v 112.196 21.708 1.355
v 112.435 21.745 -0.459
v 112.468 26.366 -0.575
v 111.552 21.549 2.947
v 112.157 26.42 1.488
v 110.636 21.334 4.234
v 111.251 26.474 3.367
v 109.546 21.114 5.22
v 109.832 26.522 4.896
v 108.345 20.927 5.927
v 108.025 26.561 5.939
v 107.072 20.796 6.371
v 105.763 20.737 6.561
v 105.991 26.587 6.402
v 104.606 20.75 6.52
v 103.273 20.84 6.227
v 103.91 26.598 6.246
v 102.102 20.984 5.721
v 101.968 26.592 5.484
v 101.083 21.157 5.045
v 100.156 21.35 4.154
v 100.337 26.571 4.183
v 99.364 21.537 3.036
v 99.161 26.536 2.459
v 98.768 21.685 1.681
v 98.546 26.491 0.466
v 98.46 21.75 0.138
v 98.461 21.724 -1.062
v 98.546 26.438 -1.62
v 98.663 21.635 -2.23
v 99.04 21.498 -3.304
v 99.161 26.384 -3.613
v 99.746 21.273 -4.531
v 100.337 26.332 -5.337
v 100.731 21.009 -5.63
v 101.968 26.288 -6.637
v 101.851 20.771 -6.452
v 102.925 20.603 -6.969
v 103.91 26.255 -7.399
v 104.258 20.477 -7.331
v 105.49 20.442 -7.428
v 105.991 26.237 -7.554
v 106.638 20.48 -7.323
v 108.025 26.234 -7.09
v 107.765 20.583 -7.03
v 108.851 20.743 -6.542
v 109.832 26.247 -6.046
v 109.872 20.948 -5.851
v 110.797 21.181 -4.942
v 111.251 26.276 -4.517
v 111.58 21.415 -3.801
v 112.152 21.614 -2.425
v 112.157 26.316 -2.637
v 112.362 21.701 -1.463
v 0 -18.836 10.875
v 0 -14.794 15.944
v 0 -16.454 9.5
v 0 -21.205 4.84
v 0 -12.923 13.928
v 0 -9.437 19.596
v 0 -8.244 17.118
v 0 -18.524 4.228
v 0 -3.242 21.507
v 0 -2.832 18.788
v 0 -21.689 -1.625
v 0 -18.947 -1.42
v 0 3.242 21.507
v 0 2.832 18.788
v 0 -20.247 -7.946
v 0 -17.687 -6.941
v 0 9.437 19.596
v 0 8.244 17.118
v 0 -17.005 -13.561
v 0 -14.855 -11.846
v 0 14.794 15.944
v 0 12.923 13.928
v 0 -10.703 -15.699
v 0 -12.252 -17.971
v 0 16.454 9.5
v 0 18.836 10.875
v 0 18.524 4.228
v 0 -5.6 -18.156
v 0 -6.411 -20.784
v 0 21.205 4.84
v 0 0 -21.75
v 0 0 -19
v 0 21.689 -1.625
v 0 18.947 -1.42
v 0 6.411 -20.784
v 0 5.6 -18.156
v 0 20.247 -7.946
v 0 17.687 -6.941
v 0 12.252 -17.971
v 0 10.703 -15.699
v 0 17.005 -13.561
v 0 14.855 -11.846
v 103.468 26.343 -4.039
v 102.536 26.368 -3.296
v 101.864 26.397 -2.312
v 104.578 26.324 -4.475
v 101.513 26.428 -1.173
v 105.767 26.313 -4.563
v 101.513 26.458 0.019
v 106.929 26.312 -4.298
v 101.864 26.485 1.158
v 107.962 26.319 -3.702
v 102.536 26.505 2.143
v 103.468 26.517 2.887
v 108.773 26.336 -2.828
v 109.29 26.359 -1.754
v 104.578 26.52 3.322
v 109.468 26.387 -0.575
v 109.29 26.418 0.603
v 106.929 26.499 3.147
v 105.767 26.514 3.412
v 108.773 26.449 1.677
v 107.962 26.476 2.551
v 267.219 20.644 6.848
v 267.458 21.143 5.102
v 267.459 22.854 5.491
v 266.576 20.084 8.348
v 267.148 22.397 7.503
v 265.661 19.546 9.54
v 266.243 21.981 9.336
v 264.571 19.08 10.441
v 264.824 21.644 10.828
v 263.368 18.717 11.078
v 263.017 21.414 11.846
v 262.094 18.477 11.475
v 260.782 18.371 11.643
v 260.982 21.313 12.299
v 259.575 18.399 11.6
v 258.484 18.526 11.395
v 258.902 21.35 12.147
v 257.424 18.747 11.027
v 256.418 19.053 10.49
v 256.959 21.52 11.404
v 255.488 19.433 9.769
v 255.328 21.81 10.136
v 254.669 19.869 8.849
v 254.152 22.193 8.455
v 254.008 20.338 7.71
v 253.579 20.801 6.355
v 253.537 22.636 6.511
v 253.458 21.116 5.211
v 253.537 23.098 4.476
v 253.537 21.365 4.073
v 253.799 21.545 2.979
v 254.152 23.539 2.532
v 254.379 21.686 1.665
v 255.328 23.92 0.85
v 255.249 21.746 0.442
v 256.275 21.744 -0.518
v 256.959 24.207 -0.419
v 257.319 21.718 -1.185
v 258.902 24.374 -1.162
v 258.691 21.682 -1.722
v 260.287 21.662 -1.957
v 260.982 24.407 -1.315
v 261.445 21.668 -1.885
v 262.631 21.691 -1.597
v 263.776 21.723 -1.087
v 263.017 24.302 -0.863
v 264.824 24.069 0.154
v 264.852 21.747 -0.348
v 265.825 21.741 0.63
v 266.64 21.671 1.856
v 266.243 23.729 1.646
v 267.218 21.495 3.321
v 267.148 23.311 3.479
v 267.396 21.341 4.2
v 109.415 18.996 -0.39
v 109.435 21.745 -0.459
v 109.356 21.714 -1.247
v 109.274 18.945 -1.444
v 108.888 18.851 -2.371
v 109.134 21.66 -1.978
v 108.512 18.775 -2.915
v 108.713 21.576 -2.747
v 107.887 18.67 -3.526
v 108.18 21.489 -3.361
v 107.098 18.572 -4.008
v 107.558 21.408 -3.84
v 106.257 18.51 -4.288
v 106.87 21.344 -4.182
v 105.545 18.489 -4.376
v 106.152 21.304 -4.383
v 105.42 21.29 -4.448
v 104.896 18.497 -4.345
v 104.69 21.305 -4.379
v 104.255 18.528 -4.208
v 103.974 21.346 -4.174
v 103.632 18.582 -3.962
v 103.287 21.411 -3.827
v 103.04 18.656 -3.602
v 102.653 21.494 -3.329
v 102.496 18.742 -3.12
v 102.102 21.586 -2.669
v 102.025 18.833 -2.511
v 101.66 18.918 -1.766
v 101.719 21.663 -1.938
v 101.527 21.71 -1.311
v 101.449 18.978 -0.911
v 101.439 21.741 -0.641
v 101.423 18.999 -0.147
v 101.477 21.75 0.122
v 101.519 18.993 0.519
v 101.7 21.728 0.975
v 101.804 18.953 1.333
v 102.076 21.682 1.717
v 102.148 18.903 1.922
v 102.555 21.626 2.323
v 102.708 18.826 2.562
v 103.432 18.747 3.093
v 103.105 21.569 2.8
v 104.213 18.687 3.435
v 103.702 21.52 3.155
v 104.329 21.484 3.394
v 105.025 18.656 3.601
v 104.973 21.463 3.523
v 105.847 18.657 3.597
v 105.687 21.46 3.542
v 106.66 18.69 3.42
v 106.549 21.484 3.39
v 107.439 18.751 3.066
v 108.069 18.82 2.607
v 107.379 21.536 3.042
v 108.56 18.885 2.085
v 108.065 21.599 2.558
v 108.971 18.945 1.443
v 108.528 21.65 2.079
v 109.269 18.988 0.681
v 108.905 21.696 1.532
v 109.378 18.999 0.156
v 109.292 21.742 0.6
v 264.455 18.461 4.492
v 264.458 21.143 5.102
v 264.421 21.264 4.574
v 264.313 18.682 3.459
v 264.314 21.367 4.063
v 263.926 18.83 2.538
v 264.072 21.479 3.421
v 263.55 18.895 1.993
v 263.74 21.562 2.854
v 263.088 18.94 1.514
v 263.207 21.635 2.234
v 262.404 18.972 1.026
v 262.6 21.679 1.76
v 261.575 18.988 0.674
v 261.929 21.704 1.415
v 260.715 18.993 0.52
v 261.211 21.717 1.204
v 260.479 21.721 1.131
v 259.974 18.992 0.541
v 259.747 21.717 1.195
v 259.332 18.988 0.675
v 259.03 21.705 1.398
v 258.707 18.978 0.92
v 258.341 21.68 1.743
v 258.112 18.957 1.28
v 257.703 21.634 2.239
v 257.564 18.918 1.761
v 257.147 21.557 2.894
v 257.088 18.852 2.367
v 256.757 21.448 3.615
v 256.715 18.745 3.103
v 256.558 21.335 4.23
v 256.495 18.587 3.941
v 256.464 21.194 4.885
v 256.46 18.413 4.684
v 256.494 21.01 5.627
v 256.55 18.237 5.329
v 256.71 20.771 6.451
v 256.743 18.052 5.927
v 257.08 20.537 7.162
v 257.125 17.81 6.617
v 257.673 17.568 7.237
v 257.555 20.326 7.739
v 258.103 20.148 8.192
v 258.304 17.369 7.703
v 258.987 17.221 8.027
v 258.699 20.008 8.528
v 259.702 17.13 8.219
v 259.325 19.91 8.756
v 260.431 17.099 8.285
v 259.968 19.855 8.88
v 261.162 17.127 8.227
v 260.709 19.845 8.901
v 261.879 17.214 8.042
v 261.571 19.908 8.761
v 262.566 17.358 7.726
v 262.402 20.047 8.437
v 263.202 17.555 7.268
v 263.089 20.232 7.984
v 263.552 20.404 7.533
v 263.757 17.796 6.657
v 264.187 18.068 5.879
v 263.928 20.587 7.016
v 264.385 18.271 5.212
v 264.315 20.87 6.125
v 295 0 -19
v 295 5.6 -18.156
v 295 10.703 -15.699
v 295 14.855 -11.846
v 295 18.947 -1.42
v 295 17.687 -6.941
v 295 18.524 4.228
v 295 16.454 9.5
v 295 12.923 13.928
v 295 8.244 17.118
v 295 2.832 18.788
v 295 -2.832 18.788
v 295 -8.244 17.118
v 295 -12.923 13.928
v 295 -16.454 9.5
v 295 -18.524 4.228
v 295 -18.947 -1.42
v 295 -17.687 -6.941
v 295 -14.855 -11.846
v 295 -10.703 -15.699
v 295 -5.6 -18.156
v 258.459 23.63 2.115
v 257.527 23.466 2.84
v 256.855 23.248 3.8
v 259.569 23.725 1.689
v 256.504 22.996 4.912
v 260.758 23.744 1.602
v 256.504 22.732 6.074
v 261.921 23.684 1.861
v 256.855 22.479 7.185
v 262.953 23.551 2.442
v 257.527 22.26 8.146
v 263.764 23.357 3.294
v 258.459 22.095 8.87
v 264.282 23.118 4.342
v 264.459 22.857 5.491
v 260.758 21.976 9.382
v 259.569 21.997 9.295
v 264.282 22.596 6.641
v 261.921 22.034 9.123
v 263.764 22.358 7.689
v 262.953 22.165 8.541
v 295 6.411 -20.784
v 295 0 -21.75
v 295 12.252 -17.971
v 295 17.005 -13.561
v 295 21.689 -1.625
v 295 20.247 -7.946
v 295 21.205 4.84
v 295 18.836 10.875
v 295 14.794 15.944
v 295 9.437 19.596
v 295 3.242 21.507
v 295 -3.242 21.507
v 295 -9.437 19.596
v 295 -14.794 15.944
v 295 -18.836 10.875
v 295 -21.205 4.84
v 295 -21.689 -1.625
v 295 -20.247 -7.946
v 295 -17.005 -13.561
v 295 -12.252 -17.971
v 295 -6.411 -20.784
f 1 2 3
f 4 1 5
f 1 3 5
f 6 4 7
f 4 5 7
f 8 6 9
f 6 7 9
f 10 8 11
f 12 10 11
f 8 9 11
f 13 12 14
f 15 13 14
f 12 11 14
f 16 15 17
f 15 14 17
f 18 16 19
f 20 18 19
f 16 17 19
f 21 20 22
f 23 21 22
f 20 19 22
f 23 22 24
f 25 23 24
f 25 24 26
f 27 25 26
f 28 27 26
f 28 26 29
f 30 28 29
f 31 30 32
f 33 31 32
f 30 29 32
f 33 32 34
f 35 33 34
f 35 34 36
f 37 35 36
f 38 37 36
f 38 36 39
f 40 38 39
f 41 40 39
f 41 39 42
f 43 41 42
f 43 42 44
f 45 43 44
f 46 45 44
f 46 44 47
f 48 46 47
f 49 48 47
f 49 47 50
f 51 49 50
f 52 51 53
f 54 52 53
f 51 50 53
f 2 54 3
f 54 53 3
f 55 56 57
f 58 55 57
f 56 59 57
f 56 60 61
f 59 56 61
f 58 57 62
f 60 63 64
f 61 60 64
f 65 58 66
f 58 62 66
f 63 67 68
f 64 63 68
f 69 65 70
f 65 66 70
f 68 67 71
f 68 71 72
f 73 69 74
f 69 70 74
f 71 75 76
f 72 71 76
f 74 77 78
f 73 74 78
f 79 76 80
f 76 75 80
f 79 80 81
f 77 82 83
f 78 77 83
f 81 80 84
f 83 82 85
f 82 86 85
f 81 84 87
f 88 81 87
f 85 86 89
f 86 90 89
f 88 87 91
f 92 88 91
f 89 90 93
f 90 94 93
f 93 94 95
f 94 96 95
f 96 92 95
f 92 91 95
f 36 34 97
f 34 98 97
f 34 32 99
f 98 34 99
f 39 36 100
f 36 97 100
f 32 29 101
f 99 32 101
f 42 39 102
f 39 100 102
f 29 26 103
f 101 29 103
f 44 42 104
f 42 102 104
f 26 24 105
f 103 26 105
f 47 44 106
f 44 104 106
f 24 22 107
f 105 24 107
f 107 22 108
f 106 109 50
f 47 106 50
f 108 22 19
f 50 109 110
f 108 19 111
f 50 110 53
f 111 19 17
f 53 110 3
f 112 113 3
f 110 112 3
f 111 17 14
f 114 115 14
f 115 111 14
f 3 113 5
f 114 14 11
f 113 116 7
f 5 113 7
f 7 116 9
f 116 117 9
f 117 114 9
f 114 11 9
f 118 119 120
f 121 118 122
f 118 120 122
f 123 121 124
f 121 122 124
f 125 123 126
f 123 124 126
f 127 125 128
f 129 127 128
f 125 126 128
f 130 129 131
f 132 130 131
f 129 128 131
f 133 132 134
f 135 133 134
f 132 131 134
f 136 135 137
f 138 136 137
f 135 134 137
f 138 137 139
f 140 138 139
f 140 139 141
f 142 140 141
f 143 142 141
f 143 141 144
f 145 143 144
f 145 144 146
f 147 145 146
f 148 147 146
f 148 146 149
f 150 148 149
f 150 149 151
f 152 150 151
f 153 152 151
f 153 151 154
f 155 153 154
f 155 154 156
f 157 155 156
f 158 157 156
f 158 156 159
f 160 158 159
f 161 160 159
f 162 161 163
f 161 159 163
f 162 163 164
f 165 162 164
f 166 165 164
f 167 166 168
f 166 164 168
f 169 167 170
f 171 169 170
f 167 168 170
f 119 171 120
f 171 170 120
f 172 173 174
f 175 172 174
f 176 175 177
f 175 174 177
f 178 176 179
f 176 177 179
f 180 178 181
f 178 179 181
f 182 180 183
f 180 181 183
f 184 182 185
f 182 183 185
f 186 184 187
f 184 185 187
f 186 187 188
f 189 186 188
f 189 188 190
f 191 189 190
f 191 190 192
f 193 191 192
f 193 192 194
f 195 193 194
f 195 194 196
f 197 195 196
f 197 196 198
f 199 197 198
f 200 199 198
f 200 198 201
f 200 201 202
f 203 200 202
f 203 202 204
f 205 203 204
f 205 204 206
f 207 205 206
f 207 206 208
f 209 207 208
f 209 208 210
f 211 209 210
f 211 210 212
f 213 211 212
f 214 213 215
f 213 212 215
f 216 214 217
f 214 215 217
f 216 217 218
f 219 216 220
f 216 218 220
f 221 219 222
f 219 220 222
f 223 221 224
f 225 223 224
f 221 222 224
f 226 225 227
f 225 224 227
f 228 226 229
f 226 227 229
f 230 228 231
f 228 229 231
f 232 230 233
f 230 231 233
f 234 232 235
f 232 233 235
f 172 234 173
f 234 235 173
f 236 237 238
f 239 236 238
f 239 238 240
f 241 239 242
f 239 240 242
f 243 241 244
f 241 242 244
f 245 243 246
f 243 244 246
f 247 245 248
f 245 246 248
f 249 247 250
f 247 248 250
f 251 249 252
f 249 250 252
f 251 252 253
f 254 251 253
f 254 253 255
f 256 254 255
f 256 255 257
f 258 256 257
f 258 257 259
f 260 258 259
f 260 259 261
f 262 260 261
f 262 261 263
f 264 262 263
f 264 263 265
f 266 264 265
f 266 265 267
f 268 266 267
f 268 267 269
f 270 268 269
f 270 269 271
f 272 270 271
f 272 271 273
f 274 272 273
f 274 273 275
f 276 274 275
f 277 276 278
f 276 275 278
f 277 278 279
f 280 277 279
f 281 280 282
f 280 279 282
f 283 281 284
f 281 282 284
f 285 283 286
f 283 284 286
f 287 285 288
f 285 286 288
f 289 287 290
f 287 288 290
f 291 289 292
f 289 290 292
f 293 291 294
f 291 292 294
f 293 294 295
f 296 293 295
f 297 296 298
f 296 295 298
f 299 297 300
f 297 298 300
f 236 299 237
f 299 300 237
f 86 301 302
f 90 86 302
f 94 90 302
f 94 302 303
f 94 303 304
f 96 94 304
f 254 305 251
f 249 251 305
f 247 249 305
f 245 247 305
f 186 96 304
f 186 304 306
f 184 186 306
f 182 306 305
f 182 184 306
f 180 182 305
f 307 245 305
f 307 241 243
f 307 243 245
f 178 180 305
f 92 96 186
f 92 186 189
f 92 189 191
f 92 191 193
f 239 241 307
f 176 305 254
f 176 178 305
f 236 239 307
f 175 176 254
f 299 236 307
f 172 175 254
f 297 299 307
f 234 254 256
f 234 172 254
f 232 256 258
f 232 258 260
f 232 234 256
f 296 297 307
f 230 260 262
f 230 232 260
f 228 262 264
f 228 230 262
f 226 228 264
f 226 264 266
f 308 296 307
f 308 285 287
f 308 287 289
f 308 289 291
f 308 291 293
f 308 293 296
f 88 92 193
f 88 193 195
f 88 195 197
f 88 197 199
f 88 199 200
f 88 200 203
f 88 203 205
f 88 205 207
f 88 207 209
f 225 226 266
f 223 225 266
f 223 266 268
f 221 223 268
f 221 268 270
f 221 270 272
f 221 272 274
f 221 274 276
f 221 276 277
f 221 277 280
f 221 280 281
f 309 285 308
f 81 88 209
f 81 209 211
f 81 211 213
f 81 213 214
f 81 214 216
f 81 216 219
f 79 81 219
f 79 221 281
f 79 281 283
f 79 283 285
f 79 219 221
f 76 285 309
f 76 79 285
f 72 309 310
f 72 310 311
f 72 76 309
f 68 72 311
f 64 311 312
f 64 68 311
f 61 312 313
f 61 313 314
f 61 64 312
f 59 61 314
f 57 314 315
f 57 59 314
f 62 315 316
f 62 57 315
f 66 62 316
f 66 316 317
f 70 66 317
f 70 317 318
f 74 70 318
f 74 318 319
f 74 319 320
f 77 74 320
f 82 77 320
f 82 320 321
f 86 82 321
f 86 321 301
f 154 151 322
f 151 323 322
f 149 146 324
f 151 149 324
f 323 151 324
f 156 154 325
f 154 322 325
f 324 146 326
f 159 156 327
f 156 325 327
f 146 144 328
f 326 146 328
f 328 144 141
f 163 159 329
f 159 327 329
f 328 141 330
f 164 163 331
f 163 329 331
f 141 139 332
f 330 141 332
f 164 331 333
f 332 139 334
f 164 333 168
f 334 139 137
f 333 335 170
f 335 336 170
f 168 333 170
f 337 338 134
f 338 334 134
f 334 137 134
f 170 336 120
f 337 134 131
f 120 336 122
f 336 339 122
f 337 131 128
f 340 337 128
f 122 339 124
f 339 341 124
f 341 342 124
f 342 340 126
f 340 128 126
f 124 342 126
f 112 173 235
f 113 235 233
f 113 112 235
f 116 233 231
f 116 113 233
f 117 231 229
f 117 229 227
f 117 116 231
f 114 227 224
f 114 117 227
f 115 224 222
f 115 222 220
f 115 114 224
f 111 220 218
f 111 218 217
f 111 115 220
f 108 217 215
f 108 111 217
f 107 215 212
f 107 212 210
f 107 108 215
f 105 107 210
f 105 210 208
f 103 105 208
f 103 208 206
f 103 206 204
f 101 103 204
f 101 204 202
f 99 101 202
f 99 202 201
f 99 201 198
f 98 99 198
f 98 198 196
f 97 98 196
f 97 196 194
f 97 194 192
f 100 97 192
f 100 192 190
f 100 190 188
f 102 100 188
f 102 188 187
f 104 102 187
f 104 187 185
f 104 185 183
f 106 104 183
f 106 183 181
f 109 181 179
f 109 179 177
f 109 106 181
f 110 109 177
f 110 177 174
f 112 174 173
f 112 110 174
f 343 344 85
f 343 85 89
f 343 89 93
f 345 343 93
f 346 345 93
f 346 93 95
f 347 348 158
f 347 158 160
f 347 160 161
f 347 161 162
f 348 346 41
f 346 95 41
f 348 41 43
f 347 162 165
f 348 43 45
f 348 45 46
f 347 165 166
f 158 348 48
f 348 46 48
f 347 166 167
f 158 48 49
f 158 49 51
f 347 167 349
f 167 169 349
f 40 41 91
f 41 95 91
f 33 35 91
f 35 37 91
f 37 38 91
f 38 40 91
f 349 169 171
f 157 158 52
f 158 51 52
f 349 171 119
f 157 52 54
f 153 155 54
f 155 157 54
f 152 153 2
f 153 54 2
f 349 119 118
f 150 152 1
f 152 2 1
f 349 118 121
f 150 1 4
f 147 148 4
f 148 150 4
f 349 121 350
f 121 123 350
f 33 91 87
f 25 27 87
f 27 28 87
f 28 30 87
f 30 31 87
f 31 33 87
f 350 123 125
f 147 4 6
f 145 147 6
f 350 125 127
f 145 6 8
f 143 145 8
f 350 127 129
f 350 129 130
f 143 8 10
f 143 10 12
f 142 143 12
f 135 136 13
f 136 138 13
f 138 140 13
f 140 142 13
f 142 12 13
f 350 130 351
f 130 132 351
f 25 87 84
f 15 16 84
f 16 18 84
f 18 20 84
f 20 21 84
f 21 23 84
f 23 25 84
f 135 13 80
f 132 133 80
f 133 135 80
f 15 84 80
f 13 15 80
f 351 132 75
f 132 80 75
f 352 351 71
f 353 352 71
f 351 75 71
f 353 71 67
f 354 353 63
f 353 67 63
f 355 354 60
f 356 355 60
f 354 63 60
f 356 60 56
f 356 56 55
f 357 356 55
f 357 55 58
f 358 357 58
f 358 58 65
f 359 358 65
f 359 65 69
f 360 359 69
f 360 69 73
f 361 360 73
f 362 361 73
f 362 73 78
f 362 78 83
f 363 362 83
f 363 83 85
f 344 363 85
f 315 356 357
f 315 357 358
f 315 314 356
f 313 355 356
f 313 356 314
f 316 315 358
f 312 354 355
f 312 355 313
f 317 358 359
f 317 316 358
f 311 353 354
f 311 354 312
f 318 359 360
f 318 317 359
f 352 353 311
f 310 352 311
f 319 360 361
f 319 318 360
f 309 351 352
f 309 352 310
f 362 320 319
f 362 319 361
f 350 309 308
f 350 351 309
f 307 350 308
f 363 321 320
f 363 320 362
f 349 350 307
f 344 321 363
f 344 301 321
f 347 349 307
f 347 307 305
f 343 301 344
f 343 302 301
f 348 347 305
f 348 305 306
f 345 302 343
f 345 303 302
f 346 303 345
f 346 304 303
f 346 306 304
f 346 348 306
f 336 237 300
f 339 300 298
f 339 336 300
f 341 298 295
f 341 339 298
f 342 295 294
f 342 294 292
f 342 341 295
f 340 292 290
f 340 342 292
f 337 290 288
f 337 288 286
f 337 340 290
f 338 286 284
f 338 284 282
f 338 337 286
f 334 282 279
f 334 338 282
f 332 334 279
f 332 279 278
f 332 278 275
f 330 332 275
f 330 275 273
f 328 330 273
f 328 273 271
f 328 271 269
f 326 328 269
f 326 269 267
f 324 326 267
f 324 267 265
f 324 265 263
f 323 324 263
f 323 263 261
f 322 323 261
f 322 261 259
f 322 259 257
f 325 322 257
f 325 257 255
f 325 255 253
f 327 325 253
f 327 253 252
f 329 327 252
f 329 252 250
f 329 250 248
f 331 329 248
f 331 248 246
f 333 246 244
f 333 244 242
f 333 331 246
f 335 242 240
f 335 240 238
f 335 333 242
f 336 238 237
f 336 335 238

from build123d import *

# Parameters (mm, degrees)
SKETCH1_R           = 21.75
SKETCH1_R_2         = 19
BOSS_EXTRUDE1_DEPTH = 295
BOSS_EXTRUDE2_REACH = 51.786
SKETCH5_R           = 7
SKETCH5_R_2         = 4
BOSS_EXTRUDE3_REACH = 51.455
SKETCH6_R           = 7
SKETCH6_R_2         = 4
SKETCH7_R           = 4
CUT_EXTRUDE1_DEPTH  = 10
SKETCH8_R           = 4
CUT_EXTRUDE2_DEPTH  = 20


with BuildPart() as part:
    # Sketch1 → Boss-Extrude1 (new body)
    with BuildSketch(Plane(origin=(0, 0, 0), x_dir=(0, 0, -1), z_dir=(1, 0, 0))):
        Circle(SKETCH1_R)
        Circle(SKETCH1_R_2, mode=Mode.SUBTRACT)
    extrude(amount=BOSS_EXTRUDE1_DEPTH)

    # Sketch5 → Boss-Extrude2 (add, up to next)
    with BuildSketch(Plane(origin=(0.022625841, 23.166571161, 5.264124015), x_dir=(0.999999546, -0.000927561, -0.00021607), z_dir=(-0.000952381, -0.975141562, -0.221580746)), mode=Mode.PRIVATE) as boss_extrude2_sk1:
        with Locations((260.436740743, 0.291462923)):
            Circle(SKETCH5_R)
        with Locations((260.436740743, 0.291462923)):
            Circle(SKETCH5_R_2, mode=Mode.SUBTRACT)
    boss_extrude2_tool1 = extrude(boss_extrude2_sk1.sketch, amount=BOSS_EXTRUDE2_REACH, mode=Mode.PRIVATE) - part.part
    add(boss_extrude2_tool1.solids().sort_by_distance((253.657243, 22.866727, 5.493539))[0])

    # Sketch6 → Boss-Extrude3 (add, up to next)
    with BuildSketch(Plane(origin=(0.192055035, 27.157330053, -0.682085947), x_dir=(0.999975011, -0.007067306, 0.000177503), z_dir=(-0.007069535, -0.999659759, 0.025107545)), mode=Mode.PRIVATE) as boss_extrude3_sk1:
        with Locations((105.278439441, 0.08752168)):
            Circle(SKETCH6_R)
        with Locations((105.278439441, 0.08752168)):
            Circle(SKETCH6_R_2, mode=Mode.SUBTRACT)
    boss_extrude3_tool1 = extrude(boss_extrude3_sk1.sketch, amount=BOSS_EXTRUDE3_REACH, mode=Mode.PRIVATE) - part.part
    add(boss_extrude3_tool1.solids().sort_by_distance((98.666024, 26.463564, -0.577112))[0])

    # Sketch7 → Cut-Extrude1 (cut)
    with BuildSketch(Plane(origin=(0.022625841, 23.166571161, 5.264124015), x_dir=(0.999999546, -0.000927561, -0.00021607), z_dir=(0.000952381, 0.975141562, 0.221580746))):
        with Locations((260.436740743, -0.291462923)):
            Circle(SKETCH7_R)
    extrude(amount=-CUT_EXTRUDE1_DEPTH, mode=Mode.SUBTRACT)

    # Sketch8 → Cut-Extrude2 (cut)
    with BuildSketch(Plane(origin=(0.192055035, 27.157330053, -0.682085947), x_dir=(0.999975011, -0.007067306, 0.000177503), z_dir=(0.007069535, 0.999659759, -0.025107545))):
        with Locations((105.278439441, -0.08752168)):
            Circle(SKETCH8_R)
    extrude(amount=-CUT_EXTRUDE2_DEPTH, mode=Mode.SUBTRACT)


solid = part.part
